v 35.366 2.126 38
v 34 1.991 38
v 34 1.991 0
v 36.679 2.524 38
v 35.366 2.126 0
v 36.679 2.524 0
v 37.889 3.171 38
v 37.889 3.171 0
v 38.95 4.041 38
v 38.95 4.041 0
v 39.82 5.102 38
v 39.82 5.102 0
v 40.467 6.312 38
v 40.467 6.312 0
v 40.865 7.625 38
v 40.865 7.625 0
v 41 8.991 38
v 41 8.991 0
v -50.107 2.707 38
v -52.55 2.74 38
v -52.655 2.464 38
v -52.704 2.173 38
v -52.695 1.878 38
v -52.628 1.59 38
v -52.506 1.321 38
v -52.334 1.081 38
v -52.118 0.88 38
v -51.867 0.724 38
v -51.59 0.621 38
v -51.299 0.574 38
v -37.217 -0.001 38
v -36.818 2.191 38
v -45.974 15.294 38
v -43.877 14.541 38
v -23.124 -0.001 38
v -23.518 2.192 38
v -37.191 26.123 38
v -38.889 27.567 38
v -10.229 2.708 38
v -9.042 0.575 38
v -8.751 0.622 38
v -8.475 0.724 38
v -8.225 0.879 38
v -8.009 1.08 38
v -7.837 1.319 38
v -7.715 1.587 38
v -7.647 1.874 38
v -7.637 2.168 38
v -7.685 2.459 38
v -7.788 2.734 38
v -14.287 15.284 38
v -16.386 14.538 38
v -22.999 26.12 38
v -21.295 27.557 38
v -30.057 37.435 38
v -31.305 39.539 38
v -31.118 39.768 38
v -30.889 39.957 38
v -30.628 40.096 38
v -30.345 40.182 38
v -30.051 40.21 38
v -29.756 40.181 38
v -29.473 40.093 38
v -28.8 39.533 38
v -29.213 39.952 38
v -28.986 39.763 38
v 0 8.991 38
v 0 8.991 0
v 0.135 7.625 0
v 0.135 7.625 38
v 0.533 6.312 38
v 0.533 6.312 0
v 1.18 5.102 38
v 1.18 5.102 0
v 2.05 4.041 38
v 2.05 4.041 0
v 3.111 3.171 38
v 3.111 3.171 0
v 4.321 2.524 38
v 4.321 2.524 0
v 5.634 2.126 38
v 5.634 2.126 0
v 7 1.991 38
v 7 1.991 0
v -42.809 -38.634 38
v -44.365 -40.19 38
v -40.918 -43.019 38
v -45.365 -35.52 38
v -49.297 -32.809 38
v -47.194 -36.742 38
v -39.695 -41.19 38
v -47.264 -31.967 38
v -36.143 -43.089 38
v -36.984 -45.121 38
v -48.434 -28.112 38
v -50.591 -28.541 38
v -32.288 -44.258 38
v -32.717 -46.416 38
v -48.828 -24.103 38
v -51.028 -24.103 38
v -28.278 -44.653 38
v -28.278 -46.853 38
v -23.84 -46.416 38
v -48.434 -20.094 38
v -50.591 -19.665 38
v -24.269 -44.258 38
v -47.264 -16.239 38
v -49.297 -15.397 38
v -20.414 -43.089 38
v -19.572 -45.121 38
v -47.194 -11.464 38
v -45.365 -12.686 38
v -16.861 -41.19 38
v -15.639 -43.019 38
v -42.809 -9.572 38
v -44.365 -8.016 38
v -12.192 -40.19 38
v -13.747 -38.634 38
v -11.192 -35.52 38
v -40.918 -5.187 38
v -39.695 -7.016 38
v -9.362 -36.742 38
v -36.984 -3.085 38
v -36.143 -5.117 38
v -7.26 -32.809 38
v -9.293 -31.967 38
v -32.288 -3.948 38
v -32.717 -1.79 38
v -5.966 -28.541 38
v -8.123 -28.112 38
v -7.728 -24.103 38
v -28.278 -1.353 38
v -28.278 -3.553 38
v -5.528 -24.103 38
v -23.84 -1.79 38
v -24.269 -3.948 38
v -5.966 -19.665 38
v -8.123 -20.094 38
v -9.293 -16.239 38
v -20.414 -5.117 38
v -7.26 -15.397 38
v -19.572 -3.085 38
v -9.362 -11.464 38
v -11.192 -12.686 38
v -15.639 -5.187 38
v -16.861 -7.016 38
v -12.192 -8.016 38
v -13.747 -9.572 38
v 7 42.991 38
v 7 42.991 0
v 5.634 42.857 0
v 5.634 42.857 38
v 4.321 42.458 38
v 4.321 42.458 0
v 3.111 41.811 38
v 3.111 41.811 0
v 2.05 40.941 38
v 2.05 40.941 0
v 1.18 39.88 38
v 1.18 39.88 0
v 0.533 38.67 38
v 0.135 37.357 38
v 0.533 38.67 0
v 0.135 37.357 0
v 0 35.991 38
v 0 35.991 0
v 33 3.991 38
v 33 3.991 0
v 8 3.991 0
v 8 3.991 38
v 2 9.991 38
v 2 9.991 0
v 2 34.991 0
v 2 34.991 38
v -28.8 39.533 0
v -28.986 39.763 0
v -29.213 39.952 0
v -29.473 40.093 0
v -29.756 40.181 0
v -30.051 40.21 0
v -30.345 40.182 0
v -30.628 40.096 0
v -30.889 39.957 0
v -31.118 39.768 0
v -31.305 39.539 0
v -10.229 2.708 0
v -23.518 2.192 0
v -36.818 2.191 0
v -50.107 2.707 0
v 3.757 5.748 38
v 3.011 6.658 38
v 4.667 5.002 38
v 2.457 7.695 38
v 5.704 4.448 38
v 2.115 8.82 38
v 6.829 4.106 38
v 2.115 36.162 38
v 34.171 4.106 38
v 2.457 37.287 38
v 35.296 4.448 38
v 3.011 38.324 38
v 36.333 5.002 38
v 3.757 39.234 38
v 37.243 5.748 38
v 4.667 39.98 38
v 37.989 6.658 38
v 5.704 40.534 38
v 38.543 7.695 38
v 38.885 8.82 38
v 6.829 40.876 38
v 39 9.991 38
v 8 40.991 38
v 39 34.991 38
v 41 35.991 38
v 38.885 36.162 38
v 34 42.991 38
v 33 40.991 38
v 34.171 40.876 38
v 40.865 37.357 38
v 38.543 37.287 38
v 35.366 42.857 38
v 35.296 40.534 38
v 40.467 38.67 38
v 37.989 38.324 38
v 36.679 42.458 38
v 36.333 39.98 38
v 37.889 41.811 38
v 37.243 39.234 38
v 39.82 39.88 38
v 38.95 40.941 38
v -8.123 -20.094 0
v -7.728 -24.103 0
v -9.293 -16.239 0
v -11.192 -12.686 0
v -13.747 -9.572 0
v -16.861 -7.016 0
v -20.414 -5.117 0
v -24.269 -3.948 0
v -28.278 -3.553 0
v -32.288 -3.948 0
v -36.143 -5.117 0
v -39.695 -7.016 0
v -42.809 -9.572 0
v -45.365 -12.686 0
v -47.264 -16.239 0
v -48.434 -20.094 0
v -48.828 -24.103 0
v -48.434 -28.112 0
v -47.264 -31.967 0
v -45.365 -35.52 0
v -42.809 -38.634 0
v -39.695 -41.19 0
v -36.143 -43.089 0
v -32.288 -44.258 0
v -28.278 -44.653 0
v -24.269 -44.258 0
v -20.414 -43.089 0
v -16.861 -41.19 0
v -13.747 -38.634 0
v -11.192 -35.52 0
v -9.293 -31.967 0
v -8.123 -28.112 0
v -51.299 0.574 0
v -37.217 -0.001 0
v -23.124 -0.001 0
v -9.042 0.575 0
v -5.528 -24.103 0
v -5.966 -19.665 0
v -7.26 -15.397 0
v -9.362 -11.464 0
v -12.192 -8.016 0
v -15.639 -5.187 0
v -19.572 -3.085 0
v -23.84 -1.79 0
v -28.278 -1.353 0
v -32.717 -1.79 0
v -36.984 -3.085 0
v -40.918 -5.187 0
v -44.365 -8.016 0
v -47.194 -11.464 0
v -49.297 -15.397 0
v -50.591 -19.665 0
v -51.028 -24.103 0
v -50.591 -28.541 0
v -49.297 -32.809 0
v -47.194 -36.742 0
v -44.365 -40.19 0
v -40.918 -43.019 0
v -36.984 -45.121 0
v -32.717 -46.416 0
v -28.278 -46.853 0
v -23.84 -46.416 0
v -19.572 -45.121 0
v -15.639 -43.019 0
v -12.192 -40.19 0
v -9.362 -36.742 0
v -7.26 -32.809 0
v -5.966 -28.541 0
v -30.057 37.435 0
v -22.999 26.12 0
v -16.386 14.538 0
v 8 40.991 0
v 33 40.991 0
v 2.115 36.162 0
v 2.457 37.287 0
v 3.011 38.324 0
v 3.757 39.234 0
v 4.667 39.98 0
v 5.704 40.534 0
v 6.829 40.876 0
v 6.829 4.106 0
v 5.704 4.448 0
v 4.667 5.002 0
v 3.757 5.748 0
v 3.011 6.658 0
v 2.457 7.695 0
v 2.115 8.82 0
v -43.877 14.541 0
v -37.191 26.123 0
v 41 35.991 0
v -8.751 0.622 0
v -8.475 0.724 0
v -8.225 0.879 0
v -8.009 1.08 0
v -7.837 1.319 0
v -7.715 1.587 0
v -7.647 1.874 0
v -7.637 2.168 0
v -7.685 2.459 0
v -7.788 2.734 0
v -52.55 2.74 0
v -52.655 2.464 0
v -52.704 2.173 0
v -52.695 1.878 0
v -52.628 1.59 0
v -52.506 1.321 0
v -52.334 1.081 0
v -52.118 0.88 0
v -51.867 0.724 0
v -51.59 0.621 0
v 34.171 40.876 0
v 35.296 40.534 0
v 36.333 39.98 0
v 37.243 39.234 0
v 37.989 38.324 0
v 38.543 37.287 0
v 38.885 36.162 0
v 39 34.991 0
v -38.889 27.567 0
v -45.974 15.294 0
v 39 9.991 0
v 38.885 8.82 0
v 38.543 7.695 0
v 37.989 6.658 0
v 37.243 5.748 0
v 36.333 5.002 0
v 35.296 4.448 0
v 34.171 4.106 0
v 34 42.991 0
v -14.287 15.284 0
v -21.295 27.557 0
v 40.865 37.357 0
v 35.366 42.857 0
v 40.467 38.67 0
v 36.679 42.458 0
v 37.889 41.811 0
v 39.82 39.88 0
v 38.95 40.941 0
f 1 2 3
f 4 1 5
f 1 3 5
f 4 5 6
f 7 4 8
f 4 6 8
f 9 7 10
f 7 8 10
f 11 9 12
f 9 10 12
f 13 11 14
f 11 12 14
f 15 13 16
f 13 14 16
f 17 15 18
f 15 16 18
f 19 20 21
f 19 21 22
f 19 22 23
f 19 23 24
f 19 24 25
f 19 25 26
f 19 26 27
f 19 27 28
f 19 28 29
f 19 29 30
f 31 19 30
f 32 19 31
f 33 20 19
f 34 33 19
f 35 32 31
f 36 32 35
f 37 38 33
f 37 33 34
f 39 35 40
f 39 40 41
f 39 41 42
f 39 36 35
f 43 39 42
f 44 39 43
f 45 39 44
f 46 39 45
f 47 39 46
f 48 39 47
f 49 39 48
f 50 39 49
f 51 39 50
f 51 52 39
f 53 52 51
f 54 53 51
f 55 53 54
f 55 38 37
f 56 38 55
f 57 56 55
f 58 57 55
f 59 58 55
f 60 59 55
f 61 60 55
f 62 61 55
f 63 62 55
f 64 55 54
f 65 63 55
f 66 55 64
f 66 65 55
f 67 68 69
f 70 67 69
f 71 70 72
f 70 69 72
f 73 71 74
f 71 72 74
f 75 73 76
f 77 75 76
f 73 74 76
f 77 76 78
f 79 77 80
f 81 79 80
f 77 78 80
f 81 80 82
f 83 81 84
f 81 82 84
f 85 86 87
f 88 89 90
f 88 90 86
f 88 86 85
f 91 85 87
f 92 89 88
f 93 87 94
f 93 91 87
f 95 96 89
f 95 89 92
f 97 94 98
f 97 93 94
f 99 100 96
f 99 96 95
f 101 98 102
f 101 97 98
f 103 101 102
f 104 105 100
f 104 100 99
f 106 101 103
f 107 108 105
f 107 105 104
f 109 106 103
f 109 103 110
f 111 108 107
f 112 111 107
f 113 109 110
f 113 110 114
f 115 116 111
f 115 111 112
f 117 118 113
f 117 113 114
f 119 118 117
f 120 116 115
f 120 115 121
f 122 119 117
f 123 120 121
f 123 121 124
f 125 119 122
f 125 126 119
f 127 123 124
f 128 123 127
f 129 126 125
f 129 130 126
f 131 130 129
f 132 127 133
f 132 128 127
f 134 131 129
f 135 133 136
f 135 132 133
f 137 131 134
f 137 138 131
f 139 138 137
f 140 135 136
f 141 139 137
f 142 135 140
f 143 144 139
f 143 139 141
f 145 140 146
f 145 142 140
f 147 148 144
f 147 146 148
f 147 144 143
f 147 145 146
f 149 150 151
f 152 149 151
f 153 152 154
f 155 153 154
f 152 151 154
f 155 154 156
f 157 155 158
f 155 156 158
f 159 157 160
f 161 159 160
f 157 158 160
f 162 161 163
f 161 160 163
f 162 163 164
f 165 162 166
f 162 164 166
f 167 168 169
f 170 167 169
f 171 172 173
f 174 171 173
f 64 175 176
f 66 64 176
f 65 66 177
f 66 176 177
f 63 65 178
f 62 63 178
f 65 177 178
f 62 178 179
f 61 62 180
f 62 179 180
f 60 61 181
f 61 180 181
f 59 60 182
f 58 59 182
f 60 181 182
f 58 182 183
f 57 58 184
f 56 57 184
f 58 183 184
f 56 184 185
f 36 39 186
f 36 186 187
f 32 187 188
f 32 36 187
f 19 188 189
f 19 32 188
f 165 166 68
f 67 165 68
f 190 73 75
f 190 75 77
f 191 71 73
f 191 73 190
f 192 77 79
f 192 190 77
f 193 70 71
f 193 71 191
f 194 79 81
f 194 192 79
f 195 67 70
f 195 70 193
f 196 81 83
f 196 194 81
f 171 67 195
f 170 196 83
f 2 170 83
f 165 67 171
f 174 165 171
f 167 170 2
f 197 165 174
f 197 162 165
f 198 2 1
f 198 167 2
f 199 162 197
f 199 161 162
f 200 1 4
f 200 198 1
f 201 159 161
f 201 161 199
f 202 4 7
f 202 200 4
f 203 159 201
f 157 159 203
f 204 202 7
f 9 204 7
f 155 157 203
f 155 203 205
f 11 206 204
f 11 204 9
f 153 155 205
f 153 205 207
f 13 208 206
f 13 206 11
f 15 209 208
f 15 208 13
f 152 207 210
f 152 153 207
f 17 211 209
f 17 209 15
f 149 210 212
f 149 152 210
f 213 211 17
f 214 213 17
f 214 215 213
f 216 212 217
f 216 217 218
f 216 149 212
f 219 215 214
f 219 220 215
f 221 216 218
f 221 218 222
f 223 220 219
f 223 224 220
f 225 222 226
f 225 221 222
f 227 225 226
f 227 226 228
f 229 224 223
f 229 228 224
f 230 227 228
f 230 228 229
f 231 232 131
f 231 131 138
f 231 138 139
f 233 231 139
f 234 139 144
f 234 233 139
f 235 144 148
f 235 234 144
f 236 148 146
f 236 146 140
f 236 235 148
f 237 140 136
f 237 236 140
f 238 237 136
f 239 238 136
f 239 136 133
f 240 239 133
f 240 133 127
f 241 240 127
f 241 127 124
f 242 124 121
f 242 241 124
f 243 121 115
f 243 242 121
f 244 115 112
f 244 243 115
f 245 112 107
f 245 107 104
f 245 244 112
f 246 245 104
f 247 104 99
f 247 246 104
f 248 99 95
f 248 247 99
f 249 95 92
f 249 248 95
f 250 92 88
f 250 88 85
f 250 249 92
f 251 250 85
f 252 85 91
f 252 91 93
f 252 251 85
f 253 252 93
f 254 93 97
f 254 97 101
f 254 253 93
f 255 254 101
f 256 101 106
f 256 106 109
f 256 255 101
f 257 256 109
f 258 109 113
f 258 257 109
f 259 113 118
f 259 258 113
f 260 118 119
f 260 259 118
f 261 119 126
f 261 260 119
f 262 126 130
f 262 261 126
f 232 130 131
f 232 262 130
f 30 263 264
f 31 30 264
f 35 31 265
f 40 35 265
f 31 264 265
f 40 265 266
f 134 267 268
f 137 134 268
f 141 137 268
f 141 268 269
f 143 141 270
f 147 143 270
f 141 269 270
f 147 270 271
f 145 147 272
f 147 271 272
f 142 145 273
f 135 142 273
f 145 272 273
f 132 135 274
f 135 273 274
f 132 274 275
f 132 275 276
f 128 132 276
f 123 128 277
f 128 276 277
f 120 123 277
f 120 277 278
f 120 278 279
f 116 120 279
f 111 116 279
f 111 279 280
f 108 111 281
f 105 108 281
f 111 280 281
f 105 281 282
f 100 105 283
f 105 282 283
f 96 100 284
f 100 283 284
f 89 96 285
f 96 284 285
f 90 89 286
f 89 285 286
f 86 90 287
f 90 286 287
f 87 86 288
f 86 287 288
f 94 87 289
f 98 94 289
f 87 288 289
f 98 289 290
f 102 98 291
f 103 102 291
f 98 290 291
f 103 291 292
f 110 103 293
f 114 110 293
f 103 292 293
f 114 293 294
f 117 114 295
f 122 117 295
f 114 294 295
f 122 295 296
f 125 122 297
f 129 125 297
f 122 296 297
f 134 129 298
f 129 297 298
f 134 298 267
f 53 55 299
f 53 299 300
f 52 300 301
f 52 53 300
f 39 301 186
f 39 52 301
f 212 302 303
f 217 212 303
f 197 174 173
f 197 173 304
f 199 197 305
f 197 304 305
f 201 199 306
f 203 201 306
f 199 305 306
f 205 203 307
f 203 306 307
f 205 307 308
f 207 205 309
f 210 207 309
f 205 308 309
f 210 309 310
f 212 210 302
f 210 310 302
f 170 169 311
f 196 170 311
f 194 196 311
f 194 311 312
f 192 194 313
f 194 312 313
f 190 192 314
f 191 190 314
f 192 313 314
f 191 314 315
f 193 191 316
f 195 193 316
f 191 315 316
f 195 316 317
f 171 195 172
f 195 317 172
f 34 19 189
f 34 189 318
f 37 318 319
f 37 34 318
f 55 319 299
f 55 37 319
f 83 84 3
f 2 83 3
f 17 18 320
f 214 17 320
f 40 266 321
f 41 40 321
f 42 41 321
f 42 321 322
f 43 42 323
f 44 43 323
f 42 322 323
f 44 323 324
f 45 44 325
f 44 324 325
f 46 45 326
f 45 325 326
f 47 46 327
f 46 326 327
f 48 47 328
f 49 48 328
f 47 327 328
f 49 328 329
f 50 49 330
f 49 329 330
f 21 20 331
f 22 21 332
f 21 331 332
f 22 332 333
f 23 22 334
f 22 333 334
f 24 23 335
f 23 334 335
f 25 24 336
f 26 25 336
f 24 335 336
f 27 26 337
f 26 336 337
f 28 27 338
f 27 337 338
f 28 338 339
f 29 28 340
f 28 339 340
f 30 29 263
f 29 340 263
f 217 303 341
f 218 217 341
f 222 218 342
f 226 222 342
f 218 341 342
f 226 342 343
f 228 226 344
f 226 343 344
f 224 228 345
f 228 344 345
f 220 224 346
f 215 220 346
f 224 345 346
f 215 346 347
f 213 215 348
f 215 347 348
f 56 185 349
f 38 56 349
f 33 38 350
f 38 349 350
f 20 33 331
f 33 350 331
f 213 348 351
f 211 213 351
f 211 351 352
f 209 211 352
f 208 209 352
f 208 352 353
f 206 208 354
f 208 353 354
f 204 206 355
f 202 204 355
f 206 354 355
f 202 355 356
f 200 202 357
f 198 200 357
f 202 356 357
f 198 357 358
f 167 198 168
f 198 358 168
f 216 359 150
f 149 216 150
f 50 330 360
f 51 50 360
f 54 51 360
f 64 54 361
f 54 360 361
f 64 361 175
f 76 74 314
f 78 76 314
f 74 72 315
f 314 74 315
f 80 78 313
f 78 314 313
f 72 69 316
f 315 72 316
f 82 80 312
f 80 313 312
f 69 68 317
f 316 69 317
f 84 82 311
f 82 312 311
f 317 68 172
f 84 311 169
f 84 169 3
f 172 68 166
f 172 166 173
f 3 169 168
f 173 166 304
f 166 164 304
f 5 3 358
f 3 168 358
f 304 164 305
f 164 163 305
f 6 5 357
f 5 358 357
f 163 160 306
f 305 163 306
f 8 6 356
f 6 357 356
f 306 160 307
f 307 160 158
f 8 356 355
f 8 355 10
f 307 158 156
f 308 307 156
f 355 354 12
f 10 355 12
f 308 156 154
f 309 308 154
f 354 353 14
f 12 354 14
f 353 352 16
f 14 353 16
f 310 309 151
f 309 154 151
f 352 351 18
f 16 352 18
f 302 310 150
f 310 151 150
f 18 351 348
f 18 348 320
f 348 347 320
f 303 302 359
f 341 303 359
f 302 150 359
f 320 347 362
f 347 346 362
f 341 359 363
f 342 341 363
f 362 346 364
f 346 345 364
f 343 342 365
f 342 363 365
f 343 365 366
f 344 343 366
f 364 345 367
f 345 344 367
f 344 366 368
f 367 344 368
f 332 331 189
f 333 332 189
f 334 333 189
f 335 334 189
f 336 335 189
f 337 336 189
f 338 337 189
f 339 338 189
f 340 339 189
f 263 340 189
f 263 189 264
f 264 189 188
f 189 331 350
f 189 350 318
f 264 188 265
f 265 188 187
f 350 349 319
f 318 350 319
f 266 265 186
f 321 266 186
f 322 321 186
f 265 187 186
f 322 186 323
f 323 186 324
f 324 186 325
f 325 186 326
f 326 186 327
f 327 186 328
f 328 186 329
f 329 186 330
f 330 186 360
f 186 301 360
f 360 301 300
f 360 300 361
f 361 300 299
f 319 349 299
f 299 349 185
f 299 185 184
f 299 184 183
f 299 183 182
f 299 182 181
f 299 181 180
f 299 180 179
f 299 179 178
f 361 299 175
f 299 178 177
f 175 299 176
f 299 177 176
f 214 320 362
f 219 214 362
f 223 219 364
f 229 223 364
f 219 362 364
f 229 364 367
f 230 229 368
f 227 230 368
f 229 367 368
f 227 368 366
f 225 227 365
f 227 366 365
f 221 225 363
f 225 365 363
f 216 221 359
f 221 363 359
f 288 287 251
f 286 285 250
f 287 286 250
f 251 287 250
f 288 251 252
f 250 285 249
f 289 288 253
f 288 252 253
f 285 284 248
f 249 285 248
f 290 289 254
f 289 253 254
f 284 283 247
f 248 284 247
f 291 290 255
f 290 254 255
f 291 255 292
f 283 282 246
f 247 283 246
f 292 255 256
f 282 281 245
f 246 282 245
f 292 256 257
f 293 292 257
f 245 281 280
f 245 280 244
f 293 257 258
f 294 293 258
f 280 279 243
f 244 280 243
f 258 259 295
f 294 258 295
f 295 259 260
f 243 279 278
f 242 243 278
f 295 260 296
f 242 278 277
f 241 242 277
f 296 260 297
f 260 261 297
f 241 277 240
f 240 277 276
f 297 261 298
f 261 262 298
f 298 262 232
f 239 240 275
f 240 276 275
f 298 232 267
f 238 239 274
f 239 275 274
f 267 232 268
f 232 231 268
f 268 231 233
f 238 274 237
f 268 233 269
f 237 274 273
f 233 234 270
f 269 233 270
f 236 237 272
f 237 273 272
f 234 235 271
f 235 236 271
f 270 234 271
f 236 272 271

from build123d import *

# Parameters (mm, degrees)
F1_DEPTH = 38
F2_R     = 22.75
F2_R_2   = 20.55
F3_DEPTH = 38
F5_DEPTH = 38
F6_T     = -2.2
F7_DEPTH = 2.201


with BuildPart() as f1:
    # F0 (on Top) → F1 (new body)
    with BuildSketch(Plane.XY):
        with BuildLine():
            ThreePointArc((0, 8.9910072129), (2.0502525317, 4.0412597446), (7, 1.9910072129))
            Line((7, 1.9910072129), (34, 1.9910072129))
            ThreePointArc((34, 1.9910072129), (38.9497474683, 4.0412597446), (41, 8.9910072129))
            Line((41, 8.9910072129), (41, 35.9910072129))
            ThreePointArc((41, 35.9910072129), (38.9497474683, 40.9407546812), (34, 42.9910072129))
            Line((34, 42.9910072129), (7, 42.9910072129))
            ThreePointArc((7, 42.9910072129), (2.0502525317, 40.9407546812), (0, 35.9910072129))
            Line((0, 35.9910072129), (0, 22.4910072129))
            Line((0, 22.4910072129), (0, 8.9910072129))
        make_face()
        with BuildLine():
            ThreePointArc((39, 9.9910072129), (37.2426406871, 5.7483665258), (33, 3.9910072129))
            Line((33, 3.9910072129), (8, 3.9910072129))
            ThreePointArc((8, 3.9910072129), (3.7573593129, 5.7483665258), (2, 9.9910072129))
            Line((2, 9.9910072129), (2, 34.9910072129))
            ThreePointArc((2, 34.9910072129), (3.7573593129, 39.2336479001), (8, 40.9910072129))
            Line((8, 40.9910072129), (33, 40.9910072129))
            ThreePointArc((33, 40.9910072129), (37.2426406871, 39.2336479001), (39, 34.9910072129))
            Line((39, 34.9910072129), (39, 9.9910072129))
        make_face(mode=Mode.SUBTRACT)
    extrude(amount=F1_DEPTH)


with BuildPart() as f3:
    # F2 (on Top) → F3 (new body)
    with BuildSketch(Plane.XY):
        with Locations((-28.2784160227, -24.1031274199)):
            Circle(F2_R)
        with Locations((-28.2784160227, -24.1031274199)):
            Circle(F2_R_2, mode=Mode.SUBTRACT)
    extrude(amount=F3_DEPTH)


with BuildPart() as f5:
    # F4 (on Top) → F5 (new body)
    with BuildSketch(Plane.XY):
        with BuildLine():
            ThreePointArc((-28.7998646526, 39.532812998), (-30.0506364627, 40.2104318074), (-31.3047349468, 39.5389898039))
            ThreePointArc((-31.3047349468, 39.5389898039), (-42.4943980882, 21.466830838), (-52.5499049688, 2.7398910912))
            ThreePointArc((-52.5499049688, 2.7398910912), (-52.5060332038, 1.3210913906), (-51.298973707, 0.5741478228))
            ThreePointArc((-51.298973707, 0.5741478228), (-30.1704969459, -0.0730919584), (-9.042041151, 0.5748318822))
            ThreePointArc((-9.042041151, 0.5748318822), (-7.8367441382, 1.3188127966), (-7.7881021186, 2.7343983447))
            ThreePointArc((-7.7881021186, 2.7343983447), (-17.7284776593, 21.456507409), (-28.7998646526, 39.532812998))
        make_face()
    extrude(amount=F5_DEPTH)

    # F6
    f6_openings = [f5.faces().sort_by_distance(p)[0] for p in [
        (-30.13542, 14.290954, 38),
    ]]
    offset(amount=F6_T, openings=f6_openings)

    # F7 (cut, through all): a face of the model
    f7_faces = [f5.faces().sort_by_distance(p)[0] for p in [
        (-30.1328701293, 14.2864664874, 2.2),
    ]]
    extrude(f7_faces, amount=-F7_DEPTH, mode=Mode.SUBTRACT)


solid = Compound([f1.part, f3.part, f5.part])
